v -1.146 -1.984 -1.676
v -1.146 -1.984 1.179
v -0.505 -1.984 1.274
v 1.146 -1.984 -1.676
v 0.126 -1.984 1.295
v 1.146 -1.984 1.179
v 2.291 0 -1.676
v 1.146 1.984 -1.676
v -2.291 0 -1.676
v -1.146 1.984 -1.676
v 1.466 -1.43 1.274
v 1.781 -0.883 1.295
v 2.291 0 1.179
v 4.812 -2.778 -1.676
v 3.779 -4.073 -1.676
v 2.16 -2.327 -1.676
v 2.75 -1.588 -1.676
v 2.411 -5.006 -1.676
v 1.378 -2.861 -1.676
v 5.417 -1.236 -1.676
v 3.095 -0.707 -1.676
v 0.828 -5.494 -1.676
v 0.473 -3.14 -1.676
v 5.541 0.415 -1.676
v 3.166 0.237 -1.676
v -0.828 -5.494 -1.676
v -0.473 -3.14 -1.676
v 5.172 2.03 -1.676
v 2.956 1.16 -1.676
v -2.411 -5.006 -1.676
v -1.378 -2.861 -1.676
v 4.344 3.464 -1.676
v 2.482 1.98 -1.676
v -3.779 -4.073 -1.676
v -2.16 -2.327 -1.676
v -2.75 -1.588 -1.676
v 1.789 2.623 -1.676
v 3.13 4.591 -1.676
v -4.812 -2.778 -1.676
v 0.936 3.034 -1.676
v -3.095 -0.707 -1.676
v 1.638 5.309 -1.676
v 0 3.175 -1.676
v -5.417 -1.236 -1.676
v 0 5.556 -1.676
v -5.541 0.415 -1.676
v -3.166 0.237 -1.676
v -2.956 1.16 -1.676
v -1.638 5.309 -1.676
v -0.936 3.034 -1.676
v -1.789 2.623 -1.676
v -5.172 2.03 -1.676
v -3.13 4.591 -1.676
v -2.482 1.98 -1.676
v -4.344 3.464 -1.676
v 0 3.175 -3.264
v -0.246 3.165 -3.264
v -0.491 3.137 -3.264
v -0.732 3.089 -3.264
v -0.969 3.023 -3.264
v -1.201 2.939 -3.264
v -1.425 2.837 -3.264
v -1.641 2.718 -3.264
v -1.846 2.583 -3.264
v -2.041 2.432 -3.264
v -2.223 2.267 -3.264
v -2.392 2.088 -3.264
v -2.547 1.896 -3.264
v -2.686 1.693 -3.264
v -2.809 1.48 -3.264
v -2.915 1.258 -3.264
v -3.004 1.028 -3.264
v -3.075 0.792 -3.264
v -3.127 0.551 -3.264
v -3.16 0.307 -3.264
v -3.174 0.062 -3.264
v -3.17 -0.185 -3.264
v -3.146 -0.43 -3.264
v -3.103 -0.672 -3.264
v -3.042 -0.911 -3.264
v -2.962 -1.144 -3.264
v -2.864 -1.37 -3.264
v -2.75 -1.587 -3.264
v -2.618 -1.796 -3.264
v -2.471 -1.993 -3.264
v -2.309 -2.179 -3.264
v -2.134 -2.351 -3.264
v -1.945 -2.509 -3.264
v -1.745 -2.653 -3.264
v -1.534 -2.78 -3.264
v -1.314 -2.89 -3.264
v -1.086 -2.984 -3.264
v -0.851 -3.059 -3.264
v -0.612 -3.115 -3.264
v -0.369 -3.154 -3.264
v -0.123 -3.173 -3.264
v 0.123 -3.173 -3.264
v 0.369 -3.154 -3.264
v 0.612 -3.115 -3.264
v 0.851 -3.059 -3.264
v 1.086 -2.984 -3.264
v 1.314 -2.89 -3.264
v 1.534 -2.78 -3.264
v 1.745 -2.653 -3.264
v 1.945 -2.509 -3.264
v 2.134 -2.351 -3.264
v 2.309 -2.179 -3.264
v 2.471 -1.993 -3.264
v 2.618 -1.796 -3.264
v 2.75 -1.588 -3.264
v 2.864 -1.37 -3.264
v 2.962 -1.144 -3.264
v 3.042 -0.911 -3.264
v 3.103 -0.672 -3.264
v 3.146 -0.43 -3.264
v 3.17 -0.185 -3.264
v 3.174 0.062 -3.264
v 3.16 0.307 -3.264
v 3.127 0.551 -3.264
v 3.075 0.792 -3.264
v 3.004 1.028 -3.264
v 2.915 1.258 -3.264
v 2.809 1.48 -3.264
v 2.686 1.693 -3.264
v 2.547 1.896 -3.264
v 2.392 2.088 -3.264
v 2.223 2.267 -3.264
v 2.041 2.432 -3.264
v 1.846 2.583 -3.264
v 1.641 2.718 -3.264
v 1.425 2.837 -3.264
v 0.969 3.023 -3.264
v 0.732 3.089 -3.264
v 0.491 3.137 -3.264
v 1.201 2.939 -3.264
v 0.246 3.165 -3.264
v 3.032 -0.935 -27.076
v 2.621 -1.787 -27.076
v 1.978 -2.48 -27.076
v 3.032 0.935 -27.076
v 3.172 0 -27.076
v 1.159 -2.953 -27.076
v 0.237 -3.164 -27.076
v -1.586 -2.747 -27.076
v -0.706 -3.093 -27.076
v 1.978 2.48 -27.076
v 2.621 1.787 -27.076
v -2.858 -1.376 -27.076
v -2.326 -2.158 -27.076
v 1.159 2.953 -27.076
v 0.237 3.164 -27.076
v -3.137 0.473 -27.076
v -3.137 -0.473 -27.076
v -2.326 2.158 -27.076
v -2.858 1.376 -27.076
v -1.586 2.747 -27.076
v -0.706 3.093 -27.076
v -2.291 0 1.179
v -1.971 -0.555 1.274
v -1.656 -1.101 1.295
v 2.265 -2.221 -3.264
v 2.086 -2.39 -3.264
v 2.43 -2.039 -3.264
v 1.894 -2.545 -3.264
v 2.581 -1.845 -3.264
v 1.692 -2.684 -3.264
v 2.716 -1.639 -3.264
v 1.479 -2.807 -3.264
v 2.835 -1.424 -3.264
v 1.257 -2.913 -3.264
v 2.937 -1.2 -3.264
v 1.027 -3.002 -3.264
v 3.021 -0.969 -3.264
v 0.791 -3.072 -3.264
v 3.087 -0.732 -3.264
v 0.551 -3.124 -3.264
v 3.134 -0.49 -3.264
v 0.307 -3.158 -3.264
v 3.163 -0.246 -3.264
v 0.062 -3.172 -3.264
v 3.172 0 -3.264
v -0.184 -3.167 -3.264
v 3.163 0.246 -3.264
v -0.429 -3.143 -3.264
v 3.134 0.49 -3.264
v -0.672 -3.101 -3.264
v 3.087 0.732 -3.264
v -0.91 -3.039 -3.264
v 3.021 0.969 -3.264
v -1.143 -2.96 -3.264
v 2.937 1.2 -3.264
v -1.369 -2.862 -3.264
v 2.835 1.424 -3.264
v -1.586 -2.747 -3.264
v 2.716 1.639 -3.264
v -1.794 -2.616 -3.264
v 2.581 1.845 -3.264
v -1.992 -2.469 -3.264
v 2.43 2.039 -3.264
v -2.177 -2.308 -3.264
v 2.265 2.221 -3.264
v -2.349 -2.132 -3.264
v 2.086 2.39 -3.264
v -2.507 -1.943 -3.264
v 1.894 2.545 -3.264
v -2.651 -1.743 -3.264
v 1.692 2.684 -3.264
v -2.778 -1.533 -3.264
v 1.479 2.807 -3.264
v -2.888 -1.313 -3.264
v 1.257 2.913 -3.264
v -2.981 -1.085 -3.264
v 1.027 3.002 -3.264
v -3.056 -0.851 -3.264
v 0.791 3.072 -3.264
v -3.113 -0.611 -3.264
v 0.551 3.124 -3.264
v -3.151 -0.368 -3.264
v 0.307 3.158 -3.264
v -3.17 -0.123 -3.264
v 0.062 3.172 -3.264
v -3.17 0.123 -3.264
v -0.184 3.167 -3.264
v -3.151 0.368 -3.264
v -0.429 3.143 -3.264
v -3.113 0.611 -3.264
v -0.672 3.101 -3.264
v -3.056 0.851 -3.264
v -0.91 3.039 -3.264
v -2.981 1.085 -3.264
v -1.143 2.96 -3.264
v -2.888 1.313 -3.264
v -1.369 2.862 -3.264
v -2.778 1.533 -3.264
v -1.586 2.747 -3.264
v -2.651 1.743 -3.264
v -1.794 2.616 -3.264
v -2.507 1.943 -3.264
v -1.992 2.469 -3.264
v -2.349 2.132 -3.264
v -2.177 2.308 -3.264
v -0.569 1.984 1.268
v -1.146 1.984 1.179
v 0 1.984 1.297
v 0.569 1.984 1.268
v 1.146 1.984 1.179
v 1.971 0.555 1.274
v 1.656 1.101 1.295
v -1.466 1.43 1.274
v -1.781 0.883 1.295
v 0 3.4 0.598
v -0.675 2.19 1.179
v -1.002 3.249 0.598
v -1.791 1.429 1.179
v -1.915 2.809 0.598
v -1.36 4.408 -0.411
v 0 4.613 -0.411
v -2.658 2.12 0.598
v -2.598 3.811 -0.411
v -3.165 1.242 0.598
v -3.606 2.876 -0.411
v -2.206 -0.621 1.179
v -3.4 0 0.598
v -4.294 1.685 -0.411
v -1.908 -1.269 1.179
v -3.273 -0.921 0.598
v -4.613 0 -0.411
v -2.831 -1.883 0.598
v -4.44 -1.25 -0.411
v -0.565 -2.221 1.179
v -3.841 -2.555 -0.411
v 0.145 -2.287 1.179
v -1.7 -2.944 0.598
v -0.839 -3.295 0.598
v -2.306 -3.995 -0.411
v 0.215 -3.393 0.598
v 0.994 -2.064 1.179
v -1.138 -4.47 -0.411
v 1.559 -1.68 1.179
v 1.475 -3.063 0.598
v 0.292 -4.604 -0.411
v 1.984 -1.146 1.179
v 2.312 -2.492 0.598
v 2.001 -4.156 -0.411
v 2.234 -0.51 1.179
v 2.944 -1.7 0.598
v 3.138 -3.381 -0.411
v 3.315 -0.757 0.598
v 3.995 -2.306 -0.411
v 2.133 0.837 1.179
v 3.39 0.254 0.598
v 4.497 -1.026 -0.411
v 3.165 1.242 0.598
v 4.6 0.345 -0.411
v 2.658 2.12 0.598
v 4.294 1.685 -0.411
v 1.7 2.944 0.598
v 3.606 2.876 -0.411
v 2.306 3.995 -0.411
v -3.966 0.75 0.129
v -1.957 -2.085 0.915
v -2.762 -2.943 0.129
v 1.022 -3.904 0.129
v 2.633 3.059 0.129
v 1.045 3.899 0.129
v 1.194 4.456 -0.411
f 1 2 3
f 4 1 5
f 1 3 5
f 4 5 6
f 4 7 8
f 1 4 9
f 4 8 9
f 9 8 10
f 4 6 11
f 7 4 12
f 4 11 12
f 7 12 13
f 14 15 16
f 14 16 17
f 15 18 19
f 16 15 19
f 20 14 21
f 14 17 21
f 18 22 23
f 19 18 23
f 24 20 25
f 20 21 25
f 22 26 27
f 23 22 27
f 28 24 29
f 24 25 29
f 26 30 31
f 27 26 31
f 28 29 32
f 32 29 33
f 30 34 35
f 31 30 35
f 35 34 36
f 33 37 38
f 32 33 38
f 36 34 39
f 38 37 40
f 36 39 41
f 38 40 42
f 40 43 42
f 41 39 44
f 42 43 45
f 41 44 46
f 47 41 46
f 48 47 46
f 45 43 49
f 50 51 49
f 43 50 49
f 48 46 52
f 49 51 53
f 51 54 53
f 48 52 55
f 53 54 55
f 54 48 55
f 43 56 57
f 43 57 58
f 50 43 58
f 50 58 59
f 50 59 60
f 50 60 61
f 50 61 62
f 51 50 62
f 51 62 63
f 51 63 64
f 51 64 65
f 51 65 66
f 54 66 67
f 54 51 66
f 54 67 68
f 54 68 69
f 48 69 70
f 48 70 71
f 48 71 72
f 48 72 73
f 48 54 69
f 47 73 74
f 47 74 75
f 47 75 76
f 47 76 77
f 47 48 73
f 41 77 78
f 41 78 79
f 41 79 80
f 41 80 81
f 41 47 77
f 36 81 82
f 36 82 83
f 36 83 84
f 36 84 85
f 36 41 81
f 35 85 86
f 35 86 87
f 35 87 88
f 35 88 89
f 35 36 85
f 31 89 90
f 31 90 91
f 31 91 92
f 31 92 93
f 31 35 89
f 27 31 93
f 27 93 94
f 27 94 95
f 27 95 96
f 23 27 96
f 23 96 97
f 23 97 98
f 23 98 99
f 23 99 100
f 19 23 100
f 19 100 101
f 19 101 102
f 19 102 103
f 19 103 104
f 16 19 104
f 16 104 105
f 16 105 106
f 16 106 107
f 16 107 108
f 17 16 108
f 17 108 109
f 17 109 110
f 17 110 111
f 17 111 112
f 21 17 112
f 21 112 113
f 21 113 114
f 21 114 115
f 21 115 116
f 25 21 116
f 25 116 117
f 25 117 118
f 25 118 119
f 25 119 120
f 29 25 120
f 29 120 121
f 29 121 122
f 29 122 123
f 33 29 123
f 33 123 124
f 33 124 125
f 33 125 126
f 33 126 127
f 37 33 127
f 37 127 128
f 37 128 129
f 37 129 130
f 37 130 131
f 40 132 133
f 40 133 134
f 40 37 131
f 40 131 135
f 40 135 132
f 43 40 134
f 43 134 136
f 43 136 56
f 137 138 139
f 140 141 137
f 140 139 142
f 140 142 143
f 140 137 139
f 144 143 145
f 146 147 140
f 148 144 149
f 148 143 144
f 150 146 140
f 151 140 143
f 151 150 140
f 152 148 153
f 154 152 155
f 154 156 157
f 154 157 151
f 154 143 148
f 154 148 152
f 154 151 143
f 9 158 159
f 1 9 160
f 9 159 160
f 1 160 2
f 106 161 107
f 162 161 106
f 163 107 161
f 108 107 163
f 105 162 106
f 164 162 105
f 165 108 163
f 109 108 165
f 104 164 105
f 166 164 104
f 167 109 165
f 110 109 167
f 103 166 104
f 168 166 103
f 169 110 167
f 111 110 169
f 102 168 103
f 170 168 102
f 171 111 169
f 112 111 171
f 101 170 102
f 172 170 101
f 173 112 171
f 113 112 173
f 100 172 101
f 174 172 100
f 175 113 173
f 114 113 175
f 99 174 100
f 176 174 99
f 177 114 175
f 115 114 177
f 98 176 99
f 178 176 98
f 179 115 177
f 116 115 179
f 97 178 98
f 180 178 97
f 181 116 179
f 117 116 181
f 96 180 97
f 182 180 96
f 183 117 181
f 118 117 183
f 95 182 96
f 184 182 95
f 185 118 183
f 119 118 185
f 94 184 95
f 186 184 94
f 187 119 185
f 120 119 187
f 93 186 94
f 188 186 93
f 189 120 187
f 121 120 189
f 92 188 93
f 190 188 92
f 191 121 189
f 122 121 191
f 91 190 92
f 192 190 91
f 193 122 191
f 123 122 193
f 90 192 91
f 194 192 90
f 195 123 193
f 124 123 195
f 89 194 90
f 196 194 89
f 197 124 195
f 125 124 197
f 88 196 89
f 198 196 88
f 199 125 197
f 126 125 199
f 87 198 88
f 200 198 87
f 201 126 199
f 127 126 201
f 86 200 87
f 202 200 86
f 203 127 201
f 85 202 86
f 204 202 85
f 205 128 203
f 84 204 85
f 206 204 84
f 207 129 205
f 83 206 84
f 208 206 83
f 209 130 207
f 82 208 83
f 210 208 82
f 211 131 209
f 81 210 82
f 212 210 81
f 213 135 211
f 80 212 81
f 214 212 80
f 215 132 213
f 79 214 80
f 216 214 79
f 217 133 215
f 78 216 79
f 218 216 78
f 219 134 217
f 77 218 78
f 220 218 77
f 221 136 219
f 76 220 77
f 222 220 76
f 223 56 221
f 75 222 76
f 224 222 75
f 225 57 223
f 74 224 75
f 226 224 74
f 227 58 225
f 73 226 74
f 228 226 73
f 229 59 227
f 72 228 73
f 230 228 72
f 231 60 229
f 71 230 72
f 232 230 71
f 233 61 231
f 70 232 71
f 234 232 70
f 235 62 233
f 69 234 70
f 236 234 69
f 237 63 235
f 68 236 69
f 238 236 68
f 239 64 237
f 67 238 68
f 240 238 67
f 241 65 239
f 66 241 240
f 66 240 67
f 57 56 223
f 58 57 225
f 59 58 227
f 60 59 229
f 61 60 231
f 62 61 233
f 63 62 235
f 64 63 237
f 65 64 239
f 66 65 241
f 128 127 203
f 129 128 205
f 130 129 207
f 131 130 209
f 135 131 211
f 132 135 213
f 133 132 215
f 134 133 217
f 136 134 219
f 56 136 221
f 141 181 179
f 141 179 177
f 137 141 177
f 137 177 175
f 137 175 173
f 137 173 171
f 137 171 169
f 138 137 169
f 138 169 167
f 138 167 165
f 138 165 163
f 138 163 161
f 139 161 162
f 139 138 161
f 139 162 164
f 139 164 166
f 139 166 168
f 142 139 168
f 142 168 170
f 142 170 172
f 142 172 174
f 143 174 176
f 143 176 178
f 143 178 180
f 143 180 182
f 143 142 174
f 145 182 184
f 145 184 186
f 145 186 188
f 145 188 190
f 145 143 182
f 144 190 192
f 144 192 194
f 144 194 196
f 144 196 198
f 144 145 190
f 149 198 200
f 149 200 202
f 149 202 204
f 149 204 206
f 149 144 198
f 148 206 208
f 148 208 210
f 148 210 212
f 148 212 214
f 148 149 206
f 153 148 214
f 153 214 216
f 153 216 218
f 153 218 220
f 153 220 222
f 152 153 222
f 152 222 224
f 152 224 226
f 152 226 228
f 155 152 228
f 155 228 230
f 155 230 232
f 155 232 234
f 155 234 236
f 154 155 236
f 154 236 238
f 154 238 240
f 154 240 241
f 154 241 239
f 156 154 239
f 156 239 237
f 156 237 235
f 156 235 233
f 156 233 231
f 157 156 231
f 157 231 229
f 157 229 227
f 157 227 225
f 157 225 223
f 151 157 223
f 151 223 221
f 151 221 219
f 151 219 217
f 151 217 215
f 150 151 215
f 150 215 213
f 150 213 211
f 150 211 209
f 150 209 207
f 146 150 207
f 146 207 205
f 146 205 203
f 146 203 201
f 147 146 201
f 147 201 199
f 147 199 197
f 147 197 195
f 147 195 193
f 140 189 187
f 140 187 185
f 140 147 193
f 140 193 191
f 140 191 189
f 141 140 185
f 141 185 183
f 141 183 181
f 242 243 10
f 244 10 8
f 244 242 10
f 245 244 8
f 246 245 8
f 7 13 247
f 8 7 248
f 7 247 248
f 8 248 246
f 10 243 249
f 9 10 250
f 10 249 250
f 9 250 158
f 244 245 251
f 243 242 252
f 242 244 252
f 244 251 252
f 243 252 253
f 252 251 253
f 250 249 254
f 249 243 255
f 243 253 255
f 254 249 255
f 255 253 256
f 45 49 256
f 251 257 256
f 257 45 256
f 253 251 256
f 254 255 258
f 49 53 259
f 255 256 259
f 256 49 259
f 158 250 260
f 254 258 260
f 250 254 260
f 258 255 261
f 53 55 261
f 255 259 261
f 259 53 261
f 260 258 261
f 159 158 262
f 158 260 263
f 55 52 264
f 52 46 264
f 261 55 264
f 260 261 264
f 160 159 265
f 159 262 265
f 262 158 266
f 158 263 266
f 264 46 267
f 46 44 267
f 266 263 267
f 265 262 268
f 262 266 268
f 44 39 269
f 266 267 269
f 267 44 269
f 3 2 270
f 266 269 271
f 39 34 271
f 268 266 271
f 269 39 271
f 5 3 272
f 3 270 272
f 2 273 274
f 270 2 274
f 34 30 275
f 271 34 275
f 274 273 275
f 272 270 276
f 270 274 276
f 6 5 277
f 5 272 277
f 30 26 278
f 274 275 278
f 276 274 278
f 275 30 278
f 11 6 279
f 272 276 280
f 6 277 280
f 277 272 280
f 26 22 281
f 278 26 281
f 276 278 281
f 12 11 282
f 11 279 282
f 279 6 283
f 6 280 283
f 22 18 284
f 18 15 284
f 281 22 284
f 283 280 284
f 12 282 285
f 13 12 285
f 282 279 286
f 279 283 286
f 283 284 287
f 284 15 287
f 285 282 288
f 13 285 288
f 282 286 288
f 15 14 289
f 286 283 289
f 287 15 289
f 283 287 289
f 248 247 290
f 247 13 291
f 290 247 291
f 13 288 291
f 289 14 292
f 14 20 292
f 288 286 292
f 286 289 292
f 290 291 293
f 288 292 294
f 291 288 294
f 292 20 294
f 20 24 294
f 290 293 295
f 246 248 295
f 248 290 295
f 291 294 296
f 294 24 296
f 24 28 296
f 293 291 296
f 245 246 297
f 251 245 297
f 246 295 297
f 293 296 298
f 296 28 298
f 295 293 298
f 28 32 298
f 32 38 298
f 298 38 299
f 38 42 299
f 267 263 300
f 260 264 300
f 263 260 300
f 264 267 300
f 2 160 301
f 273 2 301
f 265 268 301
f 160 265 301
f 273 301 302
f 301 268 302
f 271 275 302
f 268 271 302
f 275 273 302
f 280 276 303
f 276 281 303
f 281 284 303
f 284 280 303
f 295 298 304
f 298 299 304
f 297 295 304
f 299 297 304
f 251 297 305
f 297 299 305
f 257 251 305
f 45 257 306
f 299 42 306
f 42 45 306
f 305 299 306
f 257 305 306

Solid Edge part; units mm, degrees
sketch "Sketch1" plane through (0, 0, 0) normal (1, 0, 0) x (0, 1, 0)
  line L0 (0, -1.6764) -> (0, 1.6764)
  arc A0 (0, 1.6764) -> (5.55625, -1.6764) centre (-0.25374, -5.024398) cw
  line L1 (0, -1.6764) -> (5.55625, -1.6764)
  dimension "D1" = 3.3528
  dimension "D2" = 6.7056
revolve "RevolvedProtrusion1" add sketch "Sketch1" angle 360 about axis through (0, 0, -14.779625) along (0, 0, 1)
sketch "Sketch2" plane through (0, 0, -1.6764) normal (0, 0, -1) x (0, 1, 0)
  circle A0 centre (0, 0) radius 3.175
  dimension "D1" = 6.35
extrude "Protrusion1" add sketch "Sketch2" along normal blind 25.4
sketch "Sketch3" plane through (0, 0, -27.0764) normal (0, 0, -1) x (1, 0, 0)
  circle A0 centre (0, 0) radius 3.17246
  dimension "D1" = 0.0025
extrude "Cutout1" cut sketch "Sketch3" against normal blind 23.8125 flip side to cut
sketch "Sketch4" plane through (-0.603226, 0.360624, 3.3528) normal (0, 0, 1) x (1, 0, 0)
  line L0 (-0.542454, 1.623751) -> (1.748905, 1.623751)
  line L1 (2.894585, -0.360624) -> (1.748905, 1.623751)
  line L2 (1.748905, -2.344999) -> (2.894585, -0.360624)
  line L3 (-0.542454, -2.344999) -> (1.748905, -2.344999)
  line L4 (-1.688133, -0.360624) -> (-0.542454, -2.344999)
  line L5 (-0.542454, 1.623751) -> (-1.688133, -0.360624)
extrude "ExtrudedCutout_11" cut sketch "Sketch4" against normal blind 5.0292
properties part number "24101086"
